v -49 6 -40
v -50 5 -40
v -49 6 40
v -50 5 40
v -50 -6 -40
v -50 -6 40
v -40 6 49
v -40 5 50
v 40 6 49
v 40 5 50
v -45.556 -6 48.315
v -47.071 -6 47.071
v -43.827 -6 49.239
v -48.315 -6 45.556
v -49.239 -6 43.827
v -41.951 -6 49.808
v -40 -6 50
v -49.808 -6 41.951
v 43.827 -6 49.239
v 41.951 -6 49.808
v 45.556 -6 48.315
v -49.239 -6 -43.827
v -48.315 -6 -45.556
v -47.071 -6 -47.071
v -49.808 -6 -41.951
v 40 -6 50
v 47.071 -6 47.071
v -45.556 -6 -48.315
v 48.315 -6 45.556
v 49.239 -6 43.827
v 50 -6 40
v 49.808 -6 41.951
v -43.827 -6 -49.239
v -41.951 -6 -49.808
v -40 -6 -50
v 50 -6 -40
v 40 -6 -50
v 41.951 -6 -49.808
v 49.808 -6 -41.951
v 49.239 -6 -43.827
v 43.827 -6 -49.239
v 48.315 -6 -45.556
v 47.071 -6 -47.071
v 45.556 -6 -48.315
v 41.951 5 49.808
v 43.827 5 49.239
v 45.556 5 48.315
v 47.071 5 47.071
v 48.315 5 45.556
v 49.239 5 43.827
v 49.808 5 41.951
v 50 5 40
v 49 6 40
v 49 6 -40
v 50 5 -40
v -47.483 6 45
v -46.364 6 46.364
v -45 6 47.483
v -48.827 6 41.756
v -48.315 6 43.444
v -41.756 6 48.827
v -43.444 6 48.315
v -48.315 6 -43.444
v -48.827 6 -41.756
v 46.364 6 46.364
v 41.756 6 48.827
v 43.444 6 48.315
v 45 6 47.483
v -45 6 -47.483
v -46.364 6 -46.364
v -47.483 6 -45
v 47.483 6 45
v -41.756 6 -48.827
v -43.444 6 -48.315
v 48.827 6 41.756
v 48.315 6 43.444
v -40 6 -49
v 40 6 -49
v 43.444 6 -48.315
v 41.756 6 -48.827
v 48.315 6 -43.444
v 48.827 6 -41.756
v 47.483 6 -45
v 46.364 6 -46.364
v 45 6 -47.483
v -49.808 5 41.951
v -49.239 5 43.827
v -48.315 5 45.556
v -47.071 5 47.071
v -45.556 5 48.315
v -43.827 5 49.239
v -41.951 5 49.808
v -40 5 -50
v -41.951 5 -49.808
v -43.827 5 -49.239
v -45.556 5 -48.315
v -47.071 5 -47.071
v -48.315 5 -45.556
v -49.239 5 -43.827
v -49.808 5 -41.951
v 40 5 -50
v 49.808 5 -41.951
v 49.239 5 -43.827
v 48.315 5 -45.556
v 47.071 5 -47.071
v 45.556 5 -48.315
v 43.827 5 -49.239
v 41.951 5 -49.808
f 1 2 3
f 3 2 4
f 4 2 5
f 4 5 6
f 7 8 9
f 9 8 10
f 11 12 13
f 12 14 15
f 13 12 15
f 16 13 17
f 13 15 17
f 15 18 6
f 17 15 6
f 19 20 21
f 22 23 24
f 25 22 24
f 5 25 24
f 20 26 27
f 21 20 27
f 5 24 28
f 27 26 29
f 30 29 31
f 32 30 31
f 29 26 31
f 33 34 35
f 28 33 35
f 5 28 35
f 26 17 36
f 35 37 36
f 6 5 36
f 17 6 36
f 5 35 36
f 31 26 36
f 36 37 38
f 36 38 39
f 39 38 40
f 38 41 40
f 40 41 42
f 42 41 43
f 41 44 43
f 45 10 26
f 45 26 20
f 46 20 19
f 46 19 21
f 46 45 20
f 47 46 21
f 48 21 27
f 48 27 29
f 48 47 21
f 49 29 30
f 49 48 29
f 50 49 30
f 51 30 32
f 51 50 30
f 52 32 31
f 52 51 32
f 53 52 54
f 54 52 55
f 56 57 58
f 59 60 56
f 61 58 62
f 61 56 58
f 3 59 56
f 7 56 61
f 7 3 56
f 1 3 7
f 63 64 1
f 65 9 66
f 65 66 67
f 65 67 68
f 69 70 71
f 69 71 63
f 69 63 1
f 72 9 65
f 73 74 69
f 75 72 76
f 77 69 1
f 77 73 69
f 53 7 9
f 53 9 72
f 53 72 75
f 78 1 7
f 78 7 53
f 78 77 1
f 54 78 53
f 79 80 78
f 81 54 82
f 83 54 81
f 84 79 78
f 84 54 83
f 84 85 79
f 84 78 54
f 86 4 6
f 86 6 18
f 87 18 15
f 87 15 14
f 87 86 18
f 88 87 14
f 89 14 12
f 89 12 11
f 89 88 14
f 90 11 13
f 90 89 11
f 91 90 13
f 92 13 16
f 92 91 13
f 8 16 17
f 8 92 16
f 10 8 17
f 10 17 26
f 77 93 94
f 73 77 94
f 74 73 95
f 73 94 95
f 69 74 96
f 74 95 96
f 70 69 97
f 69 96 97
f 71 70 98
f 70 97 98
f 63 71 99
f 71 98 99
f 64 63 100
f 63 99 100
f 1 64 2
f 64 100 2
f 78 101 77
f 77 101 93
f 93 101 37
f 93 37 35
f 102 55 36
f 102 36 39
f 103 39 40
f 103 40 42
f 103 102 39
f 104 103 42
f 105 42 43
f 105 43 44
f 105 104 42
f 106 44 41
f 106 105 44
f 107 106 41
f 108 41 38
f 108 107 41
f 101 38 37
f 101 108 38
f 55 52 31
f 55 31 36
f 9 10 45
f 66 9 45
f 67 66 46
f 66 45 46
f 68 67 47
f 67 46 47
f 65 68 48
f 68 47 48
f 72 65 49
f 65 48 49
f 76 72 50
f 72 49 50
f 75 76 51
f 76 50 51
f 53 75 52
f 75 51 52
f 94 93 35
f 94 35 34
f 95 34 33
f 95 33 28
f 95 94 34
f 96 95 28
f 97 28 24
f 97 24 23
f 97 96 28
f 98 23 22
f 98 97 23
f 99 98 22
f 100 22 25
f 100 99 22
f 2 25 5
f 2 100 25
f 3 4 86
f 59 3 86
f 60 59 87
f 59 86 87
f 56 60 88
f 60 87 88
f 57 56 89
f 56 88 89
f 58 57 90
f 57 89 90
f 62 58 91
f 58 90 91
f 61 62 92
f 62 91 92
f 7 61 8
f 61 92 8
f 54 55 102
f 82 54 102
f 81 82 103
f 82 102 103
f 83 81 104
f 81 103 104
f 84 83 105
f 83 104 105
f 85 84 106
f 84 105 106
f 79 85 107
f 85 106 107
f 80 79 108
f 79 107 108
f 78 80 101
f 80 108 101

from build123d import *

# Parameters (mm, degrees)
BOSS_EXTRUDE1_DEPTH = 6
CHAMFER1_SIZE       = 1


with BuildPart() as part:
    # Sketch1 → Boss-Extrude1 (new body, symmetric)
    with BuildSketch(Plane(origin=(0, 0, 0), x_dir=(1, 0, 0), z_dir=(0, 1, 0))):
        with BuildLine():
            Line((-40, -50), (40, -50))
            ThreePointArc((40, -50), (47.071067812, -47.071067812), (50, -40))
            Line((50, -40), (50, 40))
            ThreePointArc((50, 40), (47.071067812, 47.071067812), (40, 50))
            Line((40, 50), (-40, 50))
            ThreePointArc((-40, 50), (-47.071067812, 47.071067812), (-50, 40))
            Line((-50, 40), (-50, -40))
            ThreePointArc((-50, -40), (-47.071067812, -47.071067812), (-40, -50))
        make_face()
    extrude(amount=BOSS_EXTRUDE1_DEPTH, both=True)

    # Chamfer1
    chamfer1_edges = [part.edges().sort_by_distance(p)[0] for p in [
        (47.071067812, 6, 47.071067812),
        (50, 6, 0),
        (47.071067812, 6, -47.071067812),
        (0, 6, -50),
        (-47.071067812, 6, -47.071067812),
        (-50, 6, 0),
        (-47.071067812, 6, 47.071067812),
        (0, 6, 50),
    ]]
    chamfer(chamfer1_edges, length=CHAMFER1_SIZE)


solid = part.part
